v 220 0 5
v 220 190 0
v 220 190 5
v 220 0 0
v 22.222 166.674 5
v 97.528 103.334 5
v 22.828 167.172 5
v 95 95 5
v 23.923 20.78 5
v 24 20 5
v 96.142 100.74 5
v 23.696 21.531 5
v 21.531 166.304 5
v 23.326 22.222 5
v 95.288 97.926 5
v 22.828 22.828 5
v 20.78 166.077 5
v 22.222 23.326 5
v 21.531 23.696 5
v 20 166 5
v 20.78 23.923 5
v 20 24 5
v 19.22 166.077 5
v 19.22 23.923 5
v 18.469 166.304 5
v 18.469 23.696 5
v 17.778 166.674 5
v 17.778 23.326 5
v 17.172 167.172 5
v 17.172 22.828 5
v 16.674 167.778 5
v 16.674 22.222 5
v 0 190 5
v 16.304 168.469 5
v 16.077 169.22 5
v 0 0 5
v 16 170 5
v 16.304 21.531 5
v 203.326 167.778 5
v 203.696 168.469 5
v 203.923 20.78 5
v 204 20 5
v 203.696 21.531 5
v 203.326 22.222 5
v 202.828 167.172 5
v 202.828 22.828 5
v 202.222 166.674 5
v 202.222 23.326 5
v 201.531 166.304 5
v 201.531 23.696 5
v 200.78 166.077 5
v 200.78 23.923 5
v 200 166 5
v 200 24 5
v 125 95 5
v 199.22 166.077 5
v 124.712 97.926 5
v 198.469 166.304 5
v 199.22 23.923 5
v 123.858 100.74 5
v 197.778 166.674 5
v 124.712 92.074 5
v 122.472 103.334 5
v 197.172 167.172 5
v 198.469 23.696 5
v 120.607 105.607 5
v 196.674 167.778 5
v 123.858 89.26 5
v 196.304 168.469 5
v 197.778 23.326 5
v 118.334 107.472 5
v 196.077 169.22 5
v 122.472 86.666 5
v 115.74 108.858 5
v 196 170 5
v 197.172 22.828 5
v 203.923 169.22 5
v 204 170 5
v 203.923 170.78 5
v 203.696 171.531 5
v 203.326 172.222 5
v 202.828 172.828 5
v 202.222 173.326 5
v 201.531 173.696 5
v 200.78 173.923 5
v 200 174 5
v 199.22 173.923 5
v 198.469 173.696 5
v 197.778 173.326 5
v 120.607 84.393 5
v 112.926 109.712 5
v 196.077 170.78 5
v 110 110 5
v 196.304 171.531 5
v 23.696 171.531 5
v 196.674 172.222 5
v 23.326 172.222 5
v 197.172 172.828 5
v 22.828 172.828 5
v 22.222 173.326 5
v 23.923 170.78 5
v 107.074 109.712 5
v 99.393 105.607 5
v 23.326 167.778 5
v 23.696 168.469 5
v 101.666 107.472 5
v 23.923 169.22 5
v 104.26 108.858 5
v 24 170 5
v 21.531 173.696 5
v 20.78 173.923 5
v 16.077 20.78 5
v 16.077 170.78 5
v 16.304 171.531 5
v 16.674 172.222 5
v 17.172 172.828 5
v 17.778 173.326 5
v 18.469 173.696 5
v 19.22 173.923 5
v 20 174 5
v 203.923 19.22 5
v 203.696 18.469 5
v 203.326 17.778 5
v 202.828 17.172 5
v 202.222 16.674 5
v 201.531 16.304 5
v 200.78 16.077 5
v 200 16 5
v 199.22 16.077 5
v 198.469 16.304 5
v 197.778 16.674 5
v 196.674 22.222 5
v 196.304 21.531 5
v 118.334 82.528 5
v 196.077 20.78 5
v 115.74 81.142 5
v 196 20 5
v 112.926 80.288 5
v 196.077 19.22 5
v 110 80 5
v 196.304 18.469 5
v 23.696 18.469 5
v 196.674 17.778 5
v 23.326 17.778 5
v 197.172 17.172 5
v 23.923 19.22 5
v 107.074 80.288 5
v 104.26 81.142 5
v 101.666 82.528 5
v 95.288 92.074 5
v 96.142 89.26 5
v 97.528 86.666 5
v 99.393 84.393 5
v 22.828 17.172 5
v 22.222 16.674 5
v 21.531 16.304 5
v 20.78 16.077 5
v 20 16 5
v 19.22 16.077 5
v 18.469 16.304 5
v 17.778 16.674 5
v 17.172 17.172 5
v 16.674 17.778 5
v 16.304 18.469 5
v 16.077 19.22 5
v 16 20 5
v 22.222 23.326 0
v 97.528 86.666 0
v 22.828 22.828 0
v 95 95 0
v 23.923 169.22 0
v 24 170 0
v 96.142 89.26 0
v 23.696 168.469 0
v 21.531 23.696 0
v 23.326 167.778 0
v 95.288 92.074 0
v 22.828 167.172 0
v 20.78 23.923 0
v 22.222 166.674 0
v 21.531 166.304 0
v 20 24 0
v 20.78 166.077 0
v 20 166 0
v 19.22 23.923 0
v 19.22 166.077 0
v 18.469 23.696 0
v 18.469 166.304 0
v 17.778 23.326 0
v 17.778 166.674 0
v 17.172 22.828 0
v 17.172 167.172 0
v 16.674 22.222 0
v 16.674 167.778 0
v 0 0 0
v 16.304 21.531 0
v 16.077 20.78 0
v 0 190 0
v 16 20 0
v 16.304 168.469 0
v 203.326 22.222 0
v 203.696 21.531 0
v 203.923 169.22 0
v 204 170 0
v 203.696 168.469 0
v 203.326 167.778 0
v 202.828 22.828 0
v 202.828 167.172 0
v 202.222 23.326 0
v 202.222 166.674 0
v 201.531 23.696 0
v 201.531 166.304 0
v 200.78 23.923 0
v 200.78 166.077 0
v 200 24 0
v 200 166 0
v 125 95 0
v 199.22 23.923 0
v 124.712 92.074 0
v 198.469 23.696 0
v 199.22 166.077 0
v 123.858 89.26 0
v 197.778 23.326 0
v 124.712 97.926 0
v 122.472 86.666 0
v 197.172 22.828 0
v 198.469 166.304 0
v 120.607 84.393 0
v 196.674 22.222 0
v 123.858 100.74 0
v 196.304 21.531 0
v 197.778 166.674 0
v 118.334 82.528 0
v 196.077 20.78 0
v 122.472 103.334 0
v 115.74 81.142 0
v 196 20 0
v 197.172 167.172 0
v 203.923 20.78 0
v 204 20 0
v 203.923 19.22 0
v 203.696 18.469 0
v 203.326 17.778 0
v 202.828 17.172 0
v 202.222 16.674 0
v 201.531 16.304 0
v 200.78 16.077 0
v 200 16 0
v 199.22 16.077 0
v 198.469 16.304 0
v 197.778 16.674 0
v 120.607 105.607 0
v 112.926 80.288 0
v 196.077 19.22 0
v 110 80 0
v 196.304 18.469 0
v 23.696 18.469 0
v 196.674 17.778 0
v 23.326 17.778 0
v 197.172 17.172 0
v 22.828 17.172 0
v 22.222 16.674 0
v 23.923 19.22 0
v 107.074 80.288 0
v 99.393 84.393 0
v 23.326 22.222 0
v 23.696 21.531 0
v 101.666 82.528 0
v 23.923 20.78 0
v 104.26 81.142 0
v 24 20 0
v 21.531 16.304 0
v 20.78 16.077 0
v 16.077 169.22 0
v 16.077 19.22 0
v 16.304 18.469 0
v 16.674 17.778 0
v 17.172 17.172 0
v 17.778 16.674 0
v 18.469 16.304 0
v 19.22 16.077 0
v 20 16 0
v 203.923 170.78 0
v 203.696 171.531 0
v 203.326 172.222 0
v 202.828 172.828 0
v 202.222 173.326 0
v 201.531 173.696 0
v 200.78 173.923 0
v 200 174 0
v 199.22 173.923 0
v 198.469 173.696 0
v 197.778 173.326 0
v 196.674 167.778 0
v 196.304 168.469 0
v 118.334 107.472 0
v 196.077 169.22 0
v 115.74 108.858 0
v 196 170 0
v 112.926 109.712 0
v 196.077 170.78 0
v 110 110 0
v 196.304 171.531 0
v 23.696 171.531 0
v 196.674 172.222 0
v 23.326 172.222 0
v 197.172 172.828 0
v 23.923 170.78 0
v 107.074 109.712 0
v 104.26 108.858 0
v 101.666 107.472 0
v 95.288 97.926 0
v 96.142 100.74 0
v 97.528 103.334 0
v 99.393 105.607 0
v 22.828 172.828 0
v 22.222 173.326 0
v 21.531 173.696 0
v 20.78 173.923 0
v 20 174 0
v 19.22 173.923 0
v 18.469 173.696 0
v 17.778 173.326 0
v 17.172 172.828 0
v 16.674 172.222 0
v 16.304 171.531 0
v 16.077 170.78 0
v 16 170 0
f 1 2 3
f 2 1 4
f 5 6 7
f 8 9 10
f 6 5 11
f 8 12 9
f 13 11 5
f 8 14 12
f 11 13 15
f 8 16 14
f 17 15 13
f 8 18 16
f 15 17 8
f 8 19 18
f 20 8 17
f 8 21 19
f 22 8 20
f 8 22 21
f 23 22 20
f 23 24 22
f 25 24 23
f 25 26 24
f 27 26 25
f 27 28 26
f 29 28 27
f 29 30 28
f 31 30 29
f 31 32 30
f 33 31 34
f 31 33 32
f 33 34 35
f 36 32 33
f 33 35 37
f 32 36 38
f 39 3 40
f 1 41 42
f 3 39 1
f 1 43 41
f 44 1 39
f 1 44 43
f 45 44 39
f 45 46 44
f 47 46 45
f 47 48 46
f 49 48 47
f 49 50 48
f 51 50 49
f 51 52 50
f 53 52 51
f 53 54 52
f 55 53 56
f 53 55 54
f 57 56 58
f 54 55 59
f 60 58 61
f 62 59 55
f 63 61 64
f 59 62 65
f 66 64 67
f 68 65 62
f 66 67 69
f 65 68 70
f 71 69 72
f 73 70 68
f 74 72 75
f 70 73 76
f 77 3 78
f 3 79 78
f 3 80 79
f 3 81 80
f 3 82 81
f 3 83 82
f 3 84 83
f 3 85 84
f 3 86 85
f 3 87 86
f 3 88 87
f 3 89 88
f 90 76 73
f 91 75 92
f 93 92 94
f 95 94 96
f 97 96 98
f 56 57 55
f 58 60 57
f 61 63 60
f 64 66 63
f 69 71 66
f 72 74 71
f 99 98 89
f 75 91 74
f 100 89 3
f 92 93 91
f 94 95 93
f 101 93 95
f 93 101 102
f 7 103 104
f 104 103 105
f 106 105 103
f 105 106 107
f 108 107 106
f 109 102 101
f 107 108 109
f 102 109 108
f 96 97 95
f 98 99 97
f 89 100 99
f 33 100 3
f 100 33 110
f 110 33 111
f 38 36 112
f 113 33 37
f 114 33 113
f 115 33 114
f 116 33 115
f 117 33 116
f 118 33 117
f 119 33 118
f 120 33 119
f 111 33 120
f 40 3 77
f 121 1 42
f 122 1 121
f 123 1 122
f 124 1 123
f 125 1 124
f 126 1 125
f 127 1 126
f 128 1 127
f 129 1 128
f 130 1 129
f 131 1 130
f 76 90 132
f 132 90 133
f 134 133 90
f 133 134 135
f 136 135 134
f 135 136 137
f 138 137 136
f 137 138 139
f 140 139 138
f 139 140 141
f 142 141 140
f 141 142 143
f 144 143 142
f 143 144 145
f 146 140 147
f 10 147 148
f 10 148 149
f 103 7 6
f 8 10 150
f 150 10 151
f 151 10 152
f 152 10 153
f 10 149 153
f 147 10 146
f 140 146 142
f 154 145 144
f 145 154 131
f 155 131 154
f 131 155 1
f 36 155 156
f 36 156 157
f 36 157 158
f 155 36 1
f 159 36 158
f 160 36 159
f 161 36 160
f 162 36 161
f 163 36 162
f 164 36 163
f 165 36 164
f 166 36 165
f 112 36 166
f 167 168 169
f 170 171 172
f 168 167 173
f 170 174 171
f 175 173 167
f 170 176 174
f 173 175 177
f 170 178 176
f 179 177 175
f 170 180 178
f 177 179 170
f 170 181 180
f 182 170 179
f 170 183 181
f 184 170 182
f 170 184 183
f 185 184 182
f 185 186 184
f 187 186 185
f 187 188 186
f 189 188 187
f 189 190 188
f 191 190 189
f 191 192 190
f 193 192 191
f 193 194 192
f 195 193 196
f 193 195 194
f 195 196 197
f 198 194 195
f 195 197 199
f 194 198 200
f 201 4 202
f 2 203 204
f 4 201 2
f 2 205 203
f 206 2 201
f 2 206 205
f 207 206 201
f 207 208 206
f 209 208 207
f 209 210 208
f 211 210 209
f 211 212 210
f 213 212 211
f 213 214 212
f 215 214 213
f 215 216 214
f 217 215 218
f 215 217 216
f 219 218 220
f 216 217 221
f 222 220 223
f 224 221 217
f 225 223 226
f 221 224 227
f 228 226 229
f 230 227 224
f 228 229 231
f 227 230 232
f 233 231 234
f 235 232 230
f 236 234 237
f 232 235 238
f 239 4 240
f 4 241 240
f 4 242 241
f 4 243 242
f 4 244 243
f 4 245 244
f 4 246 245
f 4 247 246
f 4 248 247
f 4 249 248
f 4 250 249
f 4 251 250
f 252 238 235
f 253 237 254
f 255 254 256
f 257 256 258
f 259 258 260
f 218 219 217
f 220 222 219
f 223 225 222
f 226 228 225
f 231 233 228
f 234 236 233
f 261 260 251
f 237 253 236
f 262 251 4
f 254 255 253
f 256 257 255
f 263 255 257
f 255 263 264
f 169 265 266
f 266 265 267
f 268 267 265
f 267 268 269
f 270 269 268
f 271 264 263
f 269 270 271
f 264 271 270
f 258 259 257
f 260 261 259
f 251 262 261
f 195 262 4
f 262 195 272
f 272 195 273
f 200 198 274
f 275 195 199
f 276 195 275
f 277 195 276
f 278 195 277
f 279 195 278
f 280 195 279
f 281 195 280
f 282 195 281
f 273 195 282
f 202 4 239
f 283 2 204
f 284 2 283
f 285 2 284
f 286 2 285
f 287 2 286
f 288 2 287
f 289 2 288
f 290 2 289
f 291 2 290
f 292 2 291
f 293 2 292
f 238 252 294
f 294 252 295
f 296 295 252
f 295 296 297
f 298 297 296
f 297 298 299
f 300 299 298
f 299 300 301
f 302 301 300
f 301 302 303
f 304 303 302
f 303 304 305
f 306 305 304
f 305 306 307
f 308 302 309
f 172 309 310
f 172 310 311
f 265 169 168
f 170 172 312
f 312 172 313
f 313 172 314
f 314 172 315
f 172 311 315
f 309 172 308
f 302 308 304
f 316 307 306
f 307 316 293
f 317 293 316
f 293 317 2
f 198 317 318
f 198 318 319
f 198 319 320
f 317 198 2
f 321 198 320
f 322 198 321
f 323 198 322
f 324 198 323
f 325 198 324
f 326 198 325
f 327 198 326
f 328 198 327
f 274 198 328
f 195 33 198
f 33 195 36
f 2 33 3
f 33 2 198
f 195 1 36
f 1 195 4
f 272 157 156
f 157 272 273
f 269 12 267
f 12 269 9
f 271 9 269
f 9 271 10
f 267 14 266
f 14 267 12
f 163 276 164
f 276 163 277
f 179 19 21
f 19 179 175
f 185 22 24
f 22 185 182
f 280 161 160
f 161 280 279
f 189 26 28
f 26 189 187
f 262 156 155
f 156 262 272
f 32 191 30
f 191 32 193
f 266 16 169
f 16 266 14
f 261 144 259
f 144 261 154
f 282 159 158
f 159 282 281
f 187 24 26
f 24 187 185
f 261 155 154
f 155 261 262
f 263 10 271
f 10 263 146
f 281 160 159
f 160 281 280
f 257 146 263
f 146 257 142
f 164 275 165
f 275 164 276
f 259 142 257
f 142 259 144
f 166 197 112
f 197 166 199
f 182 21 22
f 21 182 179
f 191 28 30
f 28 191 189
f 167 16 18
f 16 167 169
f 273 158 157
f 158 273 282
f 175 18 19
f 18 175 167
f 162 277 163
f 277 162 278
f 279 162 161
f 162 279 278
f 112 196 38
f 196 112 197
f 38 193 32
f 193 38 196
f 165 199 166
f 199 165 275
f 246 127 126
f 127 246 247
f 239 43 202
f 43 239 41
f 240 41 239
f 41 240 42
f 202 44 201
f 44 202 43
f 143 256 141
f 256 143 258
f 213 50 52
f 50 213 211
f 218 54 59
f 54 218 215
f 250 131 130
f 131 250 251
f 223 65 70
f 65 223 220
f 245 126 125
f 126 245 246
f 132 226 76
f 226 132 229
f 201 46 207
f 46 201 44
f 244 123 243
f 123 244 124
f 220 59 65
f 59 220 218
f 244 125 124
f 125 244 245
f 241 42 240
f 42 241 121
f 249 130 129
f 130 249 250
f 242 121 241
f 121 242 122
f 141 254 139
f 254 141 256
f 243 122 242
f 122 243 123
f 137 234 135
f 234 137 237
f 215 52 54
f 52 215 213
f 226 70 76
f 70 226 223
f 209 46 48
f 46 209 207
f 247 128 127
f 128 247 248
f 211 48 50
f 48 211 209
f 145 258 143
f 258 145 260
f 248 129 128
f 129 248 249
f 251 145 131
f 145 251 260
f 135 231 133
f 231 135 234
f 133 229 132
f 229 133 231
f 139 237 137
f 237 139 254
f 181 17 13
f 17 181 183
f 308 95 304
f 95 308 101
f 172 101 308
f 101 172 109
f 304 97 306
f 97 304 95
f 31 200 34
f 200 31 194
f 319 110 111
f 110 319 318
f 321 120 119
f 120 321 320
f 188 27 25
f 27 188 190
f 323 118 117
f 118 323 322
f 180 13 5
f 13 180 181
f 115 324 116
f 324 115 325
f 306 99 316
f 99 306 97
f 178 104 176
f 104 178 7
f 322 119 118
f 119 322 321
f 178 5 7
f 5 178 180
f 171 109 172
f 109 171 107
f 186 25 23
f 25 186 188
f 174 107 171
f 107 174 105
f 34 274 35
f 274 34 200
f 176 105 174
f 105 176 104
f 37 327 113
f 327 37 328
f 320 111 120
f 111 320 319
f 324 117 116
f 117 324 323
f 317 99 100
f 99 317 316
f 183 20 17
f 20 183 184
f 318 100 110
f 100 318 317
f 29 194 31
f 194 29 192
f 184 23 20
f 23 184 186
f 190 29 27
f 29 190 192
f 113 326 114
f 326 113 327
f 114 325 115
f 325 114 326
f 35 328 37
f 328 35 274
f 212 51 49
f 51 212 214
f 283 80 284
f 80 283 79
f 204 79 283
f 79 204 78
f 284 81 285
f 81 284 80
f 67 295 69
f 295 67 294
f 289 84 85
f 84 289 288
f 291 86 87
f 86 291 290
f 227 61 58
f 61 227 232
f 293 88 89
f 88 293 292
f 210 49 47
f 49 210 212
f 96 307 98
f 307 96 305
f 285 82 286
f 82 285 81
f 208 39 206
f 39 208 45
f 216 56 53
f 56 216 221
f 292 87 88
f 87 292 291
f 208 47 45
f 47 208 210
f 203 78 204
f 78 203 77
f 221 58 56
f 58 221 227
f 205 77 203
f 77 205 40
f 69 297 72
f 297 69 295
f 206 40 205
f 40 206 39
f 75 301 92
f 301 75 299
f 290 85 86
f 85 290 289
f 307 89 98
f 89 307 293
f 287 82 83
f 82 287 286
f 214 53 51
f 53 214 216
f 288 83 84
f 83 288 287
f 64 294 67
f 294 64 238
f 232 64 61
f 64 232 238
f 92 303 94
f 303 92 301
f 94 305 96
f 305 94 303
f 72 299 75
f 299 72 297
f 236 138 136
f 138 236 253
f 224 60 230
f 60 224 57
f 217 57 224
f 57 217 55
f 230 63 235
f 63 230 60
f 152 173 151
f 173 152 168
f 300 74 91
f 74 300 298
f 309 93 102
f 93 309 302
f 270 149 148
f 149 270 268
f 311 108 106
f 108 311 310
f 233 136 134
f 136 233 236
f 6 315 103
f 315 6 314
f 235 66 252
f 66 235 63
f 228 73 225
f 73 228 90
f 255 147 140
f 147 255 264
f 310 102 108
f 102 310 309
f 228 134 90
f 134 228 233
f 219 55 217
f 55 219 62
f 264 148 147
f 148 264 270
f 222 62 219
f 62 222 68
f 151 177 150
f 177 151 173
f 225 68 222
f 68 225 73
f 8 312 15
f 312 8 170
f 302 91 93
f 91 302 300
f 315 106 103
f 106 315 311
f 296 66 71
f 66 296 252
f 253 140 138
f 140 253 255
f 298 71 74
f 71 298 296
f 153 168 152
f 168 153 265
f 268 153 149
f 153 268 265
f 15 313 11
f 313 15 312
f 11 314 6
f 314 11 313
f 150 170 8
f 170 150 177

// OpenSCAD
$fn = 32;

// ----------------------------------------------------------------------
// Big plate: 200-250 mm adapter plate
// ----------------------------------------------------------------------

// --- parameters (mm) ---
plate_l = 220;            // plate length, X
plate_w = 190;            // plate width, Y
plate_t = 5;              // plate thickness, Z
corner_d = 8;             // corner hole diameter
corner_in = 20;           // corner hole inset from the edges
bore_d = 30;              // central bore
fit_tol = 0.1;            // tolerance for press fits, mm
free_tol = 0.5;           // tolerance for clearance fits, mm

difference() {
  cube([plate_l, plate_w, plate_t]);
  translate([corner_in, corner_in, -1]) cylinder(h = plate_t + 2, d = corner_d);
  translate([plate_l - corner_in, corner_in, -1]) cylinder(h = plate_t + 2, d = corner_d);
  translate([corner_in, plate_w - corner_in, -1]) cylinder(h = plate_t + 2, d = corner_d);
  translate([plate_l - corner_in, plate_w - corner_in, -1]) cylinder(h = plate_t + 2, d = corner_d);
  translate([plate_l / 2, plate_w / 2, -1]) cylinder(h = plate_t + 2, d = bore_d);
}
